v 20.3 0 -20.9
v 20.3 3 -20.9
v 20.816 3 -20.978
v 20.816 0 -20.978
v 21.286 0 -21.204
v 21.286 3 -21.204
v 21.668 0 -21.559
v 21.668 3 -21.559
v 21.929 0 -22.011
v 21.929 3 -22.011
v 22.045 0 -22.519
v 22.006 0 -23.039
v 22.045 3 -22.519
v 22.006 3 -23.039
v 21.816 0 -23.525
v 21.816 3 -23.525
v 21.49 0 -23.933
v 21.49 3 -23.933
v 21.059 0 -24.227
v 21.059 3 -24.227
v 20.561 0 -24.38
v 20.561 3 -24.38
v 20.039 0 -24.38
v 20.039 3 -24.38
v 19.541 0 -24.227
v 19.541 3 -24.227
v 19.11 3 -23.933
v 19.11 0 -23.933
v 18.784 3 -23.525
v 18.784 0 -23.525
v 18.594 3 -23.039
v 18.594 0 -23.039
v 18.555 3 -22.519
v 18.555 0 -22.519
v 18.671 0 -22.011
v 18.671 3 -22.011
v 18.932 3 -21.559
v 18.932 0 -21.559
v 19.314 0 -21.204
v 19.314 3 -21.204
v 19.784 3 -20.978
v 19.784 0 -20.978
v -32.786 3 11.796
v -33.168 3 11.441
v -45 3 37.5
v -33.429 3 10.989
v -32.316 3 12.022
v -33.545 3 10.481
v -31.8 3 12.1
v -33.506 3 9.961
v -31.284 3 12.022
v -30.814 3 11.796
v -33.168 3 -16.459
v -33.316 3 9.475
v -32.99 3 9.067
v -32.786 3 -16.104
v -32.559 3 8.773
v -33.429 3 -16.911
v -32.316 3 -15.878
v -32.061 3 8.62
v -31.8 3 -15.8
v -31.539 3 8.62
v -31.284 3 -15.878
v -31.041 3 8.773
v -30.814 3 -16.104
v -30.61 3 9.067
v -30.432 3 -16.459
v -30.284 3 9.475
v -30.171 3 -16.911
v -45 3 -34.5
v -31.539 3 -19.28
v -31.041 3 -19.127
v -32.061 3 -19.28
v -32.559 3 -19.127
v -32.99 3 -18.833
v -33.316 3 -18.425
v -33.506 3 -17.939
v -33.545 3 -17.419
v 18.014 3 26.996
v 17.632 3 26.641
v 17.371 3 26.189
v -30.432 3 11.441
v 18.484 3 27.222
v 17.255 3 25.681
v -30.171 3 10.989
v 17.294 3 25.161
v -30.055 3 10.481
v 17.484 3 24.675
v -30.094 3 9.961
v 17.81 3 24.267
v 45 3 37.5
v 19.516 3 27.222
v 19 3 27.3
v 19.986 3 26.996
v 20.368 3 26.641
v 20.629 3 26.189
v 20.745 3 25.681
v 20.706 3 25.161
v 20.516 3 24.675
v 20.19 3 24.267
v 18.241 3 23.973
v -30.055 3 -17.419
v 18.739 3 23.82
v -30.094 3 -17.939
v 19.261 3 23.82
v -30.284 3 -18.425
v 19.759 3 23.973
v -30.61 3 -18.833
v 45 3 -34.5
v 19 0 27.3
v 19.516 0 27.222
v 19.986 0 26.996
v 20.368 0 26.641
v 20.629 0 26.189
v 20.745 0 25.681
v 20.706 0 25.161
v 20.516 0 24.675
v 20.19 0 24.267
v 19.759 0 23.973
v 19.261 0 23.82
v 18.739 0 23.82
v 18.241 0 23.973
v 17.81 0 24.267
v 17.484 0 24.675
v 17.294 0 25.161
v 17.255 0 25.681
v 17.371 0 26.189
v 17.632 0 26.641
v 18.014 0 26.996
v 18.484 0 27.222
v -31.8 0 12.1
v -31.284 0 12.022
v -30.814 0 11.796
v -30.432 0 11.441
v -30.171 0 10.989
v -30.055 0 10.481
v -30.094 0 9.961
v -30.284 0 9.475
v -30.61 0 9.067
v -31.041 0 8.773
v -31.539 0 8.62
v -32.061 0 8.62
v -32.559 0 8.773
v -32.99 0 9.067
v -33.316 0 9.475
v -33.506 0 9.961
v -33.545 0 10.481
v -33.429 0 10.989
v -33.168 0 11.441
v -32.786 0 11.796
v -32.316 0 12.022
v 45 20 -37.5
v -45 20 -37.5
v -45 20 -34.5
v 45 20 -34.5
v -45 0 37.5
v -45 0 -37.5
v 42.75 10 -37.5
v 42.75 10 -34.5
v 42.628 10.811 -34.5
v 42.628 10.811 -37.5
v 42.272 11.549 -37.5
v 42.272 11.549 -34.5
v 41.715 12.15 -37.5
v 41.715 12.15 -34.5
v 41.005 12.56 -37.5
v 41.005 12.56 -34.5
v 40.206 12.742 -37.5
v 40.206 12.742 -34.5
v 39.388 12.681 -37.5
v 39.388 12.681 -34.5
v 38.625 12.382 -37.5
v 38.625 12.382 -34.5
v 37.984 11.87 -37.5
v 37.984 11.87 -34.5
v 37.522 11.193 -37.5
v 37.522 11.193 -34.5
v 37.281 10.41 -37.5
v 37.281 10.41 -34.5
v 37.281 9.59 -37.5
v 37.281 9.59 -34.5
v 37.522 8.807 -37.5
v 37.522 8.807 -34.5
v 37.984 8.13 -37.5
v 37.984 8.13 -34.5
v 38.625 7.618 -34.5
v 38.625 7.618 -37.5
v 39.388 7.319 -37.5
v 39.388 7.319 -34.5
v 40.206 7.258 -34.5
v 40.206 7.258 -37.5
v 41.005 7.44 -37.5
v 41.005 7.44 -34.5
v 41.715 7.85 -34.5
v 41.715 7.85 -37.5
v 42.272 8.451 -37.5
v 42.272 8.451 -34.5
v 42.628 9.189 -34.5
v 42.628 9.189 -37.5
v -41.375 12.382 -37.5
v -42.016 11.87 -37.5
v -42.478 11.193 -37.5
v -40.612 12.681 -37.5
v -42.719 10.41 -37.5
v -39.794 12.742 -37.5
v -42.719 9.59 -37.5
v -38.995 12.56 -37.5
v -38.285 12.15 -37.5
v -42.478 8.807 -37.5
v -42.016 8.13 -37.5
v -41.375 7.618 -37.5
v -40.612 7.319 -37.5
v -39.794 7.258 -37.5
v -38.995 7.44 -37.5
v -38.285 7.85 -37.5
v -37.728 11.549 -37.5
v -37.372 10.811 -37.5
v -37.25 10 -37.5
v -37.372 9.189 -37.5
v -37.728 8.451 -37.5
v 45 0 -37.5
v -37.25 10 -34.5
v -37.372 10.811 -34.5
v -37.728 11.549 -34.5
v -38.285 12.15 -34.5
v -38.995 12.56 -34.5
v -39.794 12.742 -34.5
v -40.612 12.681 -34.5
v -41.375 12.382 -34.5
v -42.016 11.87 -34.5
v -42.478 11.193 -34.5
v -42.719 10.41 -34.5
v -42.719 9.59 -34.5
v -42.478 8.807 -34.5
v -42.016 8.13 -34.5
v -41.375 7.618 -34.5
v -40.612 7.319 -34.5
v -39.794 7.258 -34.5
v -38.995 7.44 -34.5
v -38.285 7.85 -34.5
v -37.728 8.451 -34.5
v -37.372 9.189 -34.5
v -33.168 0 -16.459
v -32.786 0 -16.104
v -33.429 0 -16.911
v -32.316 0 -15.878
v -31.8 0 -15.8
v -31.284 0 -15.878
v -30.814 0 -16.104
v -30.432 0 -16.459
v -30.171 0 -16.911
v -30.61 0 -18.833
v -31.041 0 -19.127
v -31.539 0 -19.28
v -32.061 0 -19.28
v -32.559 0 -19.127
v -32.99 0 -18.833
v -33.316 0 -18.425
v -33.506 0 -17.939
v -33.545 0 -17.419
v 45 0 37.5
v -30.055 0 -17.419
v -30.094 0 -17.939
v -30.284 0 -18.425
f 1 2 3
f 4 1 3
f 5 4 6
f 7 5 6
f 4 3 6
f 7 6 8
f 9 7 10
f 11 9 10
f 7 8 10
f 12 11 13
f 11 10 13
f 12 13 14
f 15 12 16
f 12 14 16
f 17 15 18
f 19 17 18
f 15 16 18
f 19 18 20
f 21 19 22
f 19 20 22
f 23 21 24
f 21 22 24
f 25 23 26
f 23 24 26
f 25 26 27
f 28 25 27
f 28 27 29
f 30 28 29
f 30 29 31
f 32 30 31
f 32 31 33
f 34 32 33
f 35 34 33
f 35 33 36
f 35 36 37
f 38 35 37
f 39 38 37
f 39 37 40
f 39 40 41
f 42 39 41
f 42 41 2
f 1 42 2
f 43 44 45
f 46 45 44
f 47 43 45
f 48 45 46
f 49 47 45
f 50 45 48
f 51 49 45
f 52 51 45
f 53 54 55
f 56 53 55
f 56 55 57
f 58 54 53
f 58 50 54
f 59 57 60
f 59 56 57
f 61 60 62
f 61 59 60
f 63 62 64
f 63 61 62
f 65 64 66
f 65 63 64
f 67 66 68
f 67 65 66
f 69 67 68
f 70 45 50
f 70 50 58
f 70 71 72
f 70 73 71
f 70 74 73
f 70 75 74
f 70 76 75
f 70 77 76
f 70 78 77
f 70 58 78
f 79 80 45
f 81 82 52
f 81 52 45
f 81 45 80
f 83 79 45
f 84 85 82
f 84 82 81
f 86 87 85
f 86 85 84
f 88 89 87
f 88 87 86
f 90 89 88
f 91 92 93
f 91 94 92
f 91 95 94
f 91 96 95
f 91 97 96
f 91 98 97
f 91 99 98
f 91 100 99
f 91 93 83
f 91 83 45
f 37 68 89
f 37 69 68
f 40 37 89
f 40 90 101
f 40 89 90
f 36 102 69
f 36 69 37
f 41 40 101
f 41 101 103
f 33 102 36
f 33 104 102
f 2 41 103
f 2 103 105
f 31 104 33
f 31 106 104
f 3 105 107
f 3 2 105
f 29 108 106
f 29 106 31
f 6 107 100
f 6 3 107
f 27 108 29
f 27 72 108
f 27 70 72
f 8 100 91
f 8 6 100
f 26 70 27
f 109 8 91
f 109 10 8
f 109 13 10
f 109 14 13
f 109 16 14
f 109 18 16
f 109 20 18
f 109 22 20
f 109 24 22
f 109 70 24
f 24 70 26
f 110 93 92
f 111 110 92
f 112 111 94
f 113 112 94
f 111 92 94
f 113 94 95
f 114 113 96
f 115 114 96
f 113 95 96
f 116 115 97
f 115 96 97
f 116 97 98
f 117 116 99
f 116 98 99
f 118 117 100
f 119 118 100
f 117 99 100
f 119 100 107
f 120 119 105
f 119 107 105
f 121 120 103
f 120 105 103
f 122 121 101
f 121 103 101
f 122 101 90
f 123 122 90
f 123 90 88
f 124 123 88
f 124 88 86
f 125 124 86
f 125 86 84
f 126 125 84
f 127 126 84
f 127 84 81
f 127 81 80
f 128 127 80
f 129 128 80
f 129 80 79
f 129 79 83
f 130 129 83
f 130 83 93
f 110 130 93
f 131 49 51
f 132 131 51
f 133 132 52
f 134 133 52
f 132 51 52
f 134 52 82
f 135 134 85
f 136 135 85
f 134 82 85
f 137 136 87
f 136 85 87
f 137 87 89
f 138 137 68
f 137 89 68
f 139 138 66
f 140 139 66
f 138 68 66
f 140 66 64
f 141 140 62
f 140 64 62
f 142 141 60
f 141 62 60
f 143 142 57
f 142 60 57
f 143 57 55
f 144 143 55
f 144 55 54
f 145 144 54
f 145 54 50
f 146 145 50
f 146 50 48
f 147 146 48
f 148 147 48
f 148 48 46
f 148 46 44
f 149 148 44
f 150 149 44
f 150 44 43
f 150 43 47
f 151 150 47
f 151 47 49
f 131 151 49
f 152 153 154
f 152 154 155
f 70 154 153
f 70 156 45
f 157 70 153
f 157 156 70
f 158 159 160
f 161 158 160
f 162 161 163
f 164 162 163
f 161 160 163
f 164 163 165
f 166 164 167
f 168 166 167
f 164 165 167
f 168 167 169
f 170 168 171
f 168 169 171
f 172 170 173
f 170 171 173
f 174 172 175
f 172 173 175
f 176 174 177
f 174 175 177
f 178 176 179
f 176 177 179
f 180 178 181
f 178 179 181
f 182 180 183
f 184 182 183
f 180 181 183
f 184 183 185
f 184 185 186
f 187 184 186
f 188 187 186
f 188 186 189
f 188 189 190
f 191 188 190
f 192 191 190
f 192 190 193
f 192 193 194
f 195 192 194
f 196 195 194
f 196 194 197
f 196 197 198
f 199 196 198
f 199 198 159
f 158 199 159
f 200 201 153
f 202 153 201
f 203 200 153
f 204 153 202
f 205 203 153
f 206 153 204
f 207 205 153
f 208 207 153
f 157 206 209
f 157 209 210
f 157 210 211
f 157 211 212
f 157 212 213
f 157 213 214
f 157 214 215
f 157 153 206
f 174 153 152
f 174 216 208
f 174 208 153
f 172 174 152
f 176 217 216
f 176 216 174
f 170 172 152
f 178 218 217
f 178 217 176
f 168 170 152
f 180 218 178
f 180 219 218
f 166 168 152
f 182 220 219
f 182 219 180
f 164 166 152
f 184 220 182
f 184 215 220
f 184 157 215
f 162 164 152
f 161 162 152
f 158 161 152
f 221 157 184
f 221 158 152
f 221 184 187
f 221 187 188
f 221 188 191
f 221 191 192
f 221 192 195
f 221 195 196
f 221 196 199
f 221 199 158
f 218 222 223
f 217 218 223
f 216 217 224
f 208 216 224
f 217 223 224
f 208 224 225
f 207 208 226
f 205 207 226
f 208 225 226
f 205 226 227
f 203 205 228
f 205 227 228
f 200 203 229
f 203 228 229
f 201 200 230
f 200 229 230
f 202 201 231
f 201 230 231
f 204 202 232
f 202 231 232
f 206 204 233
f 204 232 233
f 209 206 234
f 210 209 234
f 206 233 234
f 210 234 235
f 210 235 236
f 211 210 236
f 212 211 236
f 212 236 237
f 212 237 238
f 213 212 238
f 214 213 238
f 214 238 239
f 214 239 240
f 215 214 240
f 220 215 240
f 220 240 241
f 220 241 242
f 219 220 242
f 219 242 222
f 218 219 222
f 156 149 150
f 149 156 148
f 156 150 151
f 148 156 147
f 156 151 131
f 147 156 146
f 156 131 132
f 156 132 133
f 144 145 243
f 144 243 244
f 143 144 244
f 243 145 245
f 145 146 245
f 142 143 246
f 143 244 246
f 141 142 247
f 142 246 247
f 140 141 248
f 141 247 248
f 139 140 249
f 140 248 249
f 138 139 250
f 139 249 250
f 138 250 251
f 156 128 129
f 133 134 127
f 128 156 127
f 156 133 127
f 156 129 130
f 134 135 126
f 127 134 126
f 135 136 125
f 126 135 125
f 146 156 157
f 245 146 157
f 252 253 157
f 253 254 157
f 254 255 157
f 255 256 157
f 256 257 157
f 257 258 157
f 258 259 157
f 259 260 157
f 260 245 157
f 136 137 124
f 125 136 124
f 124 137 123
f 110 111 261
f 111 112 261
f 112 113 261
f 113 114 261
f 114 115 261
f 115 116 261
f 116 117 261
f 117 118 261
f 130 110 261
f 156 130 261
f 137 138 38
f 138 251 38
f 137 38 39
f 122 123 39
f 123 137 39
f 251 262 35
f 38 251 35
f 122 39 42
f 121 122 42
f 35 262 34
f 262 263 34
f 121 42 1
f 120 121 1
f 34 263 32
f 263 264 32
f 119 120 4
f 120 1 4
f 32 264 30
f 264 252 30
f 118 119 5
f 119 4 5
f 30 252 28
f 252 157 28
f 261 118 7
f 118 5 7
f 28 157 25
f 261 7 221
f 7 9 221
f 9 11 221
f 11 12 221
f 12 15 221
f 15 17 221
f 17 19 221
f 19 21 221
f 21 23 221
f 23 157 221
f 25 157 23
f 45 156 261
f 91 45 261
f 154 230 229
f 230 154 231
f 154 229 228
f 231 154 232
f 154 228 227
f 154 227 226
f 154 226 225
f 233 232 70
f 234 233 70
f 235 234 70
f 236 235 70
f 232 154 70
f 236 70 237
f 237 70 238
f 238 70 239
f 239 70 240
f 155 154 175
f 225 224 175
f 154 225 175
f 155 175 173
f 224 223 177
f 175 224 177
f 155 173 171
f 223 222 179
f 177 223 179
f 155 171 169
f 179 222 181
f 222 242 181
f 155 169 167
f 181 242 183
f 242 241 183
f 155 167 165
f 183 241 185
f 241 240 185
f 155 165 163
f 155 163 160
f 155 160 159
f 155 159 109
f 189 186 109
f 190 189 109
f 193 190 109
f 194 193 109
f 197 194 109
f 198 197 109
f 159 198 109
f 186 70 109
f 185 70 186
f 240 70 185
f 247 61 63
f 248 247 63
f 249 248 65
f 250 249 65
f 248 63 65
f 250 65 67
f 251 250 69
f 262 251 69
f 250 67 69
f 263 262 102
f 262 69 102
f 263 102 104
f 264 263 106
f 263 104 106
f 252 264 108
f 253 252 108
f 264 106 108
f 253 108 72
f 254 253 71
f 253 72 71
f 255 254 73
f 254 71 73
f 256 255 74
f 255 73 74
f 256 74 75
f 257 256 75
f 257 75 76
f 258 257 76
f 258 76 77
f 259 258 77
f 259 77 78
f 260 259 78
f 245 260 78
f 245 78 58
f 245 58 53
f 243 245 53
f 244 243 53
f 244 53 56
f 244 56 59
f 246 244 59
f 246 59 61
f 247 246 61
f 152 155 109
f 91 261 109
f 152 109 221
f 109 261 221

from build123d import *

# Parameters (mm, degrees)
SKETCH1_W            = 90
SKETCH1_H            = 75
BOSS_EXTRUDE1_DEPTH  = 3
SKETCH2_W            = 90
SKETCH2_H            = 3
BOSS_EXTRUDE2_DEPTH  = 17
M5_CLEARANCE_HOLE1_D = 5.5
CUT_EXTRUDE1_REACH   = 62.994
SKETCH5_R            = 1.75


with BuildPart() as part:
    # Sketch1 → Boss-Extrude1 (new body)
    with BuildSketch(Plane(origin=(0, 0, 0), x_dir=(1, 0, 0), z_dir=(0, 1, 0))):
        Rectangle(SKETCH1_W, SKETCH1_H)
    extrude(amount=BOSS_EXTRUDE1_DEPTH)

    # Sketch2 → Boss-Extrude2 (add)
    with BuildSketch(Plane(origin=(0, 3, 0), x_dir=(1, 0, 0), z_dir=(0, 1, 0))):
        with Locations((0, 36)):
            Rectangle(SKETCH2_W, SKETCH2_H)
    extrude(amount=BOSS_EXTRUDE2_DEPTH)

    # M5 Clearance Hole1 (through all)
    with Locations(Plane(origin=(40, 10, -37.5), x_dir=(-1, 0, 0), z_dir=(0, 0, -1))):
        with Locations((0, 0), (80, 0)):
            Hole(M5_CLEARANCE_HOLE1_D / 2)

    # Sketch5 → Cut-Extrude1 (cut, up to next)
    with BuildSketch(Plane(origin=(0, 3, 0), x_dir=(1, 0, 0), z_dir=(0, 1, 0)), mode=Mode.PRIVATE) as cut_extrude1_sk1:
        with Locations(Location((-31.8, 17.55, 0), (0, 0, 270))):
            Circle(SKETCH5_R)
    cut_extrude1_tool1 = extrude(cut_extrude1_sk1.sketch, amount=-CUT_EXTRUDE1_REACH, mode=Mode.PRIVATE) & part.part
    # Sketch5 → Cut-Extrude1 (cut, up to next)
    with BuildSketch(Plane(origin=(0, 3, 0), x_dir=(1, 0, 0), z_dir=(0, 1, 0)), mode=Mode.PRIVATE) as cut_extrude1_sk2:
        with Locations(Location((-31.8, -10.35, 0), (0, 0, 270))):
            Circle(SKETCH5_R)
    cut_extrude1_tool2 = extrude(cut_extrude1_sk2.sketch, amount=-CUT_EXTRUDE1_REACH, mode=Mode.PRIVATE) & part.part
    # Sketch5 → Cut-Extrude1 (cut, up to next)
    with BuildSketch(Plane(origin=(0, 3, 0), x_dir=(1, 0, 0), z_dir=(0, 1, 0)), mode=Mode.PRIVATE) as cut_extrude1_sk3:
        with Locations(Location((19, -25.55, 0), (0, 0, 270))):
            Circle(SKETCH5_R)
    cut_extrude1_tool3 = extrude(cut_extrude1_sk3.sketch, amount=-CUT_EXTRUDE1_REACH, mode=Mode.PRIVATE) & part.part
    # Sketch5 → Cut-Extrude1 (cut, up to next)
    with BuildSketch(Plane(origin=(0, 3, 0), x_dir=(1, 0, 0), z_dir=(0, 1, 0)), mode=Mode.PRIVATE) as cut_extrude1_sk4:
        with Locations(Location((20.3, 22.65, 0), (0, 0, 270))):
            Circle(SKETCH5_R)
    cut_extrude1_tool4 = extrude(cut_extrude1_sk4.sketch, amount=-CUT_EXTRUDE1_REACH, mode=Mode.PRIVATE) & part.part
    add(cut_extrude1_tool1.solids().sort_by_distance((-31.8, 3, -17.55))[0], mode=Mode.SUBTRACT)
    add(cut_extrude1_tool2.solids().sort_by_distance((-31.8, 3, 10.35))[0], mode=Mode.SUBTRACT)
    add(cut_extrude1_tool3.solids().sort_by_distance((19, 3, 25.55))[0], mode=Mode.SUBTRACT)
    add(cut_extrude1_tool4.solids().sort_by_distance((20.3, 3, -22.65))[0], mode=Mode.SUBTRACT)


solid = part.part
